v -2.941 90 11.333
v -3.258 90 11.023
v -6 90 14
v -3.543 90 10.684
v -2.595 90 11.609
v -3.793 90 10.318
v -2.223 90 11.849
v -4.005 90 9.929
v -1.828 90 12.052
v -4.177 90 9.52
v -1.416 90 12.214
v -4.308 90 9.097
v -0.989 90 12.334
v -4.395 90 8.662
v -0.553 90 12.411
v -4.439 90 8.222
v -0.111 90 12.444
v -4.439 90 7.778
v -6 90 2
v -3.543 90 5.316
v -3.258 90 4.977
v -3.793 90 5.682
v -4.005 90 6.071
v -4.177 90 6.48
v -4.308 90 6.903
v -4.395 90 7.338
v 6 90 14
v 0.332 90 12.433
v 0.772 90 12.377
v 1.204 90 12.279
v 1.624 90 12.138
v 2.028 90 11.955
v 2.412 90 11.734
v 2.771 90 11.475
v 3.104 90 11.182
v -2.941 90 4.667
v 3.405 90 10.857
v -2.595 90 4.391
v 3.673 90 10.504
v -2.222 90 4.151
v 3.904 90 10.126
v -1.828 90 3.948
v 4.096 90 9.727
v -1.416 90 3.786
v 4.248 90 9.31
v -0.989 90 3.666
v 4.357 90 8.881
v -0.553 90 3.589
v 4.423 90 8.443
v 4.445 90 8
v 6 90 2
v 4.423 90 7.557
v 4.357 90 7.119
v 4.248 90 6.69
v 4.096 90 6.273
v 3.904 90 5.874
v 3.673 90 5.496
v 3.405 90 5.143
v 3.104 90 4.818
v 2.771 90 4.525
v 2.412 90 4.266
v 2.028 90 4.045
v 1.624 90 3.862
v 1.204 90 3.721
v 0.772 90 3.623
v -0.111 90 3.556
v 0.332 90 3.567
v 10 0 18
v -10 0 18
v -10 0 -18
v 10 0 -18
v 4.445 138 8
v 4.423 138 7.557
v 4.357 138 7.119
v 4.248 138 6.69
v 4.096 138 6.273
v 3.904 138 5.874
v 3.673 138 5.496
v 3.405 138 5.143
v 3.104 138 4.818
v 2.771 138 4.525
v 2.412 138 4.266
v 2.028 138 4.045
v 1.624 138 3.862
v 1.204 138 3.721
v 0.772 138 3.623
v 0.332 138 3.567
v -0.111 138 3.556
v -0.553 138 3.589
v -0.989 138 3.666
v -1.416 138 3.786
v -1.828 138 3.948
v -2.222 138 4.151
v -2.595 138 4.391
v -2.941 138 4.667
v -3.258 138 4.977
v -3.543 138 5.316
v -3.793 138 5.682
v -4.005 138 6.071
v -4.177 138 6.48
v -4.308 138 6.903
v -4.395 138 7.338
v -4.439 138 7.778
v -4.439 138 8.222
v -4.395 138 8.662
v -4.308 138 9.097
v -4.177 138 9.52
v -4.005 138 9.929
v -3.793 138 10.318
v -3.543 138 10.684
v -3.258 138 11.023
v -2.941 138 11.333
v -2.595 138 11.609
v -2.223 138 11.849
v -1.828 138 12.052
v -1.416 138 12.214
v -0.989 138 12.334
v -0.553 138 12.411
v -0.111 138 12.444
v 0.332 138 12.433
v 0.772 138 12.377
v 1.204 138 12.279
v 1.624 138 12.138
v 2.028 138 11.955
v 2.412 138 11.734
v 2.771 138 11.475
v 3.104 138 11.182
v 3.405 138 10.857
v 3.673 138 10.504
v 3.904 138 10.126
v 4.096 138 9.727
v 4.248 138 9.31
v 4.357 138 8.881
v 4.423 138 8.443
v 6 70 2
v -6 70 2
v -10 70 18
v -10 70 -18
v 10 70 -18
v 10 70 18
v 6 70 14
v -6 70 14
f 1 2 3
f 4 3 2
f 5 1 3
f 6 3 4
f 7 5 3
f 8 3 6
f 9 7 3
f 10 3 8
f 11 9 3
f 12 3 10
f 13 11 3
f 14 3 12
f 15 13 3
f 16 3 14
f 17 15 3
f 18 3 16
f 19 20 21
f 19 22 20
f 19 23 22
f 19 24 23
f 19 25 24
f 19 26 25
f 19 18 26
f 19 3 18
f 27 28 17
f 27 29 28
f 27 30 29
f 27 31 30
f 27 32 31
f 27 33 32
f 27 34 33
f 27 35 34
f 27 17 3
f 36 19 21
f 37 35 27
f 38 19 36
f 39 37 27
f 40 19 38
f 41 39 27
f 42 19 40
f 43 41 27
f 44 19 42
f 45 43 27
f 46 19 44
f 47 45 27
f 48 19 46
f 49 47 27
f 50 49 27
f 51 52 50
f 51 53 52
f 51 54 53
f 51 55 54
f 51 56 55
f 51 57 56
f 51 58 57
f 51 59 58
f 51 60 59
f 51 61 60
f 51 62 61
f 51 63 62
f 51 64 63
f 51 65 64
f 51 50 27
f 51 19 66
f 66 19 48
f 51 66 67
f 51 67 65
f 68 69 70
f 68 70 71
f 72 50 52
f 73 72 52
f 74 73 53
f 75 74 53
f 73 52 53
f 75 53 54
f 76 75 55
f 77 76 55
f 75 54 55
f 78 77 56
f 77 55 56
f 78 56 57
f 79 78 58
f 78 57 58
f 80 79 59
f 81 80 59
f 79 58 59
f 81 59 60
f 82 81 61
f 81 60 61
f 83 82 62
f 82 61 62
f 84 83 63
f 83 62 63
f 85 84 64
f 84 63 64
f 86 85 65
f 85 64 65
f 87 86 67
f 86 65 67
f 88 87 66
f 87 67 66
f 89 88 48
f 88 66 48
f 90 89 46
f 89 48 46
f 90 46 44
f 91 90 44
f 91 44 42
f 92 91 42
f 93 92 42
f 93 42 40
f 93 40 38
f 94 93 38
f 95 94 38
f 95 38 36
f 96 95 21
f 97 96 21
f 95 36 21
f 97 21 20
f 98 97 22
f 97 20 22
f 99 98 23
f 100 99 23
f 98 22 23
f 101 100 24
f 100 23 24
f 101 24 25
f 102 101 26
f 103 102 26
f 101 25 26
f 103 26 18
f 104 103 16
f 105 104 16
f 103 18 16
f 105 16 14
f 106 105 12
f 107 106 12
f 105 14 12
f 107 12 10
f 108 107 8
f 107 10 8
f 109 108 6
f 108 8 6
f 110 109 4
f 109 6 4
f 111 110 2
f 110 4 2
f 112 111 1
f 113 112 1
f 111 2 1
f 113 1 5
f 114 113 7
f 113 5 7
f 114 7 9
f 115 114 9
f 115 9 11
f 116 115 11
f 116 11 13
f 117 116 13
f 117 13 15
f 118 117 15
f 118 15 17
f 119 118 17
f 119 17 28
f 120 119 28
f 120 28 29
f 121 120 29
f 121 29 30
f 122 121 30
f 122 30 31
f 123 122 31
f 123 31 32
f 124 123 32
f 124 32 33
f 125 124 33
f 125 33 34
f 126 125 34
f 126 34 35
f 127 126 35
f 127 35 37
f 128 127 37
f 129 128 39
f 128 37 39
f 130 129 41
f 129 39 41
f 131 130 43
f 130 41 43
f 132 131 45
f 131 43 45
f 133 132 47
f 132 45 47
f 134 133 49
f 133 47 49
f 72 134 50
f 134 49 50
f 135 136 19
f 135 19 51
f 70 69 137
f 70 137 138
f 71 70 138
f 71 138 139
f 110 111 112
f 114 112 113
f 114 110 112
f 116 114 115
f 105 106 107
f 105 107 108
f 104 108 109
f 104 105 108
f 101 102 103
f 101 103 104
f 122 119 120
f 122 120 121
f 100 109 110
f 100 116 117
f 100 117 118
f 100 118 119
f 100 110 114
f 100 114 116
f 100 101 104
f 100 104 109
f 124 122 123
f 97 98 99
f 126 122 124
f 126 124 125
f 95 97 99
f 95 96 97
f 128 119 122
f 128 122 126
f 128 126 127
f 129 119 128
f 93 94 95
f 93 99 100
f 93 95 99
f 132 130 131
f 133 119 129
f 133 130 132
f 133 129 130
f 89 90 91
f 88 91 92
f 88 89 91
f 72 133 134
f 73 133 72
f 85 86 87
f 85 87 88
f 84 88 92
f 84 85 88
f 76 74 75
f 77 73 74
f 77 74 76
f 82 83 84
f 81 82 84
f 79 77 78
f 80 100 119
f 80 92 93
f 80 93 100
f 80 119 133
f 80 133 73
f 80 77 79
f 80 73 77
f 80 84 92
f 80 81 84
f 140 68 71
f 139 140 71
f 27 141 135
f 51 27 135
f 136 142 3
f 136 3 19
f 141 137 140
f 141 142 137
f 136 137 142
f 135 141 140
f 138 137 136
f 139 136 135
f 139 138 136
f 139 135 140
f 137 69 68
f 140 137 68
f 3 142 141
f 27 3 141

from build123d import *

# Parameters (mm, degrees)
SKETCH1_W           = 20
SKETCH1_H           = 36
BOSS_EXTRUDE1_DEPTH = 70
SKETCH2_W           = 12
SKETCH2_H           = 12
BOSS_EXTRUDE2_DEPTH = 20
SKETCH3_R           = 4.445
BOSS_EXTRUDE3_DEPTH = 48


with BuildPart() as part:
    # Sketch1 → Boss-Extrude1 (new body)
    with BuildSketch(Plane(origin=(0, 0, 0), x_dir=(1, 0, 0), z_dir=(0, 1, 0))):
        Rectangle(SKETCH1_W, SKETCH1_H)
    extrude(amount=BOSS_EXTRUDE1_DEPTH)

    # Sketch2 → Boss-Extrude2 (add)
    with BuildSketch(Plane(origin=(0, 70, 0), x_dir=(1, 0, 0), z_dir=(0, 1, 0))):
        with Locations((0, -8)):
            Rectangle(SKETCH2_W, SKETCH2_H)
    extrude(amount=BOSS_EXTRUDE2_DEPTH)

    # Sketch3 → Boss-Extrude3 (add)
    with BuildSketch(Plane(origin=(0, 90, 0), x_dir=(1, 0, 0), z_dir=(0, 1, 0))):
        with Locations((0, -8)):
            Circle(SKETCH3_R)
    extrude(amount=BOSS_EXTRUDE3_DEPTH)


solid = part.part
